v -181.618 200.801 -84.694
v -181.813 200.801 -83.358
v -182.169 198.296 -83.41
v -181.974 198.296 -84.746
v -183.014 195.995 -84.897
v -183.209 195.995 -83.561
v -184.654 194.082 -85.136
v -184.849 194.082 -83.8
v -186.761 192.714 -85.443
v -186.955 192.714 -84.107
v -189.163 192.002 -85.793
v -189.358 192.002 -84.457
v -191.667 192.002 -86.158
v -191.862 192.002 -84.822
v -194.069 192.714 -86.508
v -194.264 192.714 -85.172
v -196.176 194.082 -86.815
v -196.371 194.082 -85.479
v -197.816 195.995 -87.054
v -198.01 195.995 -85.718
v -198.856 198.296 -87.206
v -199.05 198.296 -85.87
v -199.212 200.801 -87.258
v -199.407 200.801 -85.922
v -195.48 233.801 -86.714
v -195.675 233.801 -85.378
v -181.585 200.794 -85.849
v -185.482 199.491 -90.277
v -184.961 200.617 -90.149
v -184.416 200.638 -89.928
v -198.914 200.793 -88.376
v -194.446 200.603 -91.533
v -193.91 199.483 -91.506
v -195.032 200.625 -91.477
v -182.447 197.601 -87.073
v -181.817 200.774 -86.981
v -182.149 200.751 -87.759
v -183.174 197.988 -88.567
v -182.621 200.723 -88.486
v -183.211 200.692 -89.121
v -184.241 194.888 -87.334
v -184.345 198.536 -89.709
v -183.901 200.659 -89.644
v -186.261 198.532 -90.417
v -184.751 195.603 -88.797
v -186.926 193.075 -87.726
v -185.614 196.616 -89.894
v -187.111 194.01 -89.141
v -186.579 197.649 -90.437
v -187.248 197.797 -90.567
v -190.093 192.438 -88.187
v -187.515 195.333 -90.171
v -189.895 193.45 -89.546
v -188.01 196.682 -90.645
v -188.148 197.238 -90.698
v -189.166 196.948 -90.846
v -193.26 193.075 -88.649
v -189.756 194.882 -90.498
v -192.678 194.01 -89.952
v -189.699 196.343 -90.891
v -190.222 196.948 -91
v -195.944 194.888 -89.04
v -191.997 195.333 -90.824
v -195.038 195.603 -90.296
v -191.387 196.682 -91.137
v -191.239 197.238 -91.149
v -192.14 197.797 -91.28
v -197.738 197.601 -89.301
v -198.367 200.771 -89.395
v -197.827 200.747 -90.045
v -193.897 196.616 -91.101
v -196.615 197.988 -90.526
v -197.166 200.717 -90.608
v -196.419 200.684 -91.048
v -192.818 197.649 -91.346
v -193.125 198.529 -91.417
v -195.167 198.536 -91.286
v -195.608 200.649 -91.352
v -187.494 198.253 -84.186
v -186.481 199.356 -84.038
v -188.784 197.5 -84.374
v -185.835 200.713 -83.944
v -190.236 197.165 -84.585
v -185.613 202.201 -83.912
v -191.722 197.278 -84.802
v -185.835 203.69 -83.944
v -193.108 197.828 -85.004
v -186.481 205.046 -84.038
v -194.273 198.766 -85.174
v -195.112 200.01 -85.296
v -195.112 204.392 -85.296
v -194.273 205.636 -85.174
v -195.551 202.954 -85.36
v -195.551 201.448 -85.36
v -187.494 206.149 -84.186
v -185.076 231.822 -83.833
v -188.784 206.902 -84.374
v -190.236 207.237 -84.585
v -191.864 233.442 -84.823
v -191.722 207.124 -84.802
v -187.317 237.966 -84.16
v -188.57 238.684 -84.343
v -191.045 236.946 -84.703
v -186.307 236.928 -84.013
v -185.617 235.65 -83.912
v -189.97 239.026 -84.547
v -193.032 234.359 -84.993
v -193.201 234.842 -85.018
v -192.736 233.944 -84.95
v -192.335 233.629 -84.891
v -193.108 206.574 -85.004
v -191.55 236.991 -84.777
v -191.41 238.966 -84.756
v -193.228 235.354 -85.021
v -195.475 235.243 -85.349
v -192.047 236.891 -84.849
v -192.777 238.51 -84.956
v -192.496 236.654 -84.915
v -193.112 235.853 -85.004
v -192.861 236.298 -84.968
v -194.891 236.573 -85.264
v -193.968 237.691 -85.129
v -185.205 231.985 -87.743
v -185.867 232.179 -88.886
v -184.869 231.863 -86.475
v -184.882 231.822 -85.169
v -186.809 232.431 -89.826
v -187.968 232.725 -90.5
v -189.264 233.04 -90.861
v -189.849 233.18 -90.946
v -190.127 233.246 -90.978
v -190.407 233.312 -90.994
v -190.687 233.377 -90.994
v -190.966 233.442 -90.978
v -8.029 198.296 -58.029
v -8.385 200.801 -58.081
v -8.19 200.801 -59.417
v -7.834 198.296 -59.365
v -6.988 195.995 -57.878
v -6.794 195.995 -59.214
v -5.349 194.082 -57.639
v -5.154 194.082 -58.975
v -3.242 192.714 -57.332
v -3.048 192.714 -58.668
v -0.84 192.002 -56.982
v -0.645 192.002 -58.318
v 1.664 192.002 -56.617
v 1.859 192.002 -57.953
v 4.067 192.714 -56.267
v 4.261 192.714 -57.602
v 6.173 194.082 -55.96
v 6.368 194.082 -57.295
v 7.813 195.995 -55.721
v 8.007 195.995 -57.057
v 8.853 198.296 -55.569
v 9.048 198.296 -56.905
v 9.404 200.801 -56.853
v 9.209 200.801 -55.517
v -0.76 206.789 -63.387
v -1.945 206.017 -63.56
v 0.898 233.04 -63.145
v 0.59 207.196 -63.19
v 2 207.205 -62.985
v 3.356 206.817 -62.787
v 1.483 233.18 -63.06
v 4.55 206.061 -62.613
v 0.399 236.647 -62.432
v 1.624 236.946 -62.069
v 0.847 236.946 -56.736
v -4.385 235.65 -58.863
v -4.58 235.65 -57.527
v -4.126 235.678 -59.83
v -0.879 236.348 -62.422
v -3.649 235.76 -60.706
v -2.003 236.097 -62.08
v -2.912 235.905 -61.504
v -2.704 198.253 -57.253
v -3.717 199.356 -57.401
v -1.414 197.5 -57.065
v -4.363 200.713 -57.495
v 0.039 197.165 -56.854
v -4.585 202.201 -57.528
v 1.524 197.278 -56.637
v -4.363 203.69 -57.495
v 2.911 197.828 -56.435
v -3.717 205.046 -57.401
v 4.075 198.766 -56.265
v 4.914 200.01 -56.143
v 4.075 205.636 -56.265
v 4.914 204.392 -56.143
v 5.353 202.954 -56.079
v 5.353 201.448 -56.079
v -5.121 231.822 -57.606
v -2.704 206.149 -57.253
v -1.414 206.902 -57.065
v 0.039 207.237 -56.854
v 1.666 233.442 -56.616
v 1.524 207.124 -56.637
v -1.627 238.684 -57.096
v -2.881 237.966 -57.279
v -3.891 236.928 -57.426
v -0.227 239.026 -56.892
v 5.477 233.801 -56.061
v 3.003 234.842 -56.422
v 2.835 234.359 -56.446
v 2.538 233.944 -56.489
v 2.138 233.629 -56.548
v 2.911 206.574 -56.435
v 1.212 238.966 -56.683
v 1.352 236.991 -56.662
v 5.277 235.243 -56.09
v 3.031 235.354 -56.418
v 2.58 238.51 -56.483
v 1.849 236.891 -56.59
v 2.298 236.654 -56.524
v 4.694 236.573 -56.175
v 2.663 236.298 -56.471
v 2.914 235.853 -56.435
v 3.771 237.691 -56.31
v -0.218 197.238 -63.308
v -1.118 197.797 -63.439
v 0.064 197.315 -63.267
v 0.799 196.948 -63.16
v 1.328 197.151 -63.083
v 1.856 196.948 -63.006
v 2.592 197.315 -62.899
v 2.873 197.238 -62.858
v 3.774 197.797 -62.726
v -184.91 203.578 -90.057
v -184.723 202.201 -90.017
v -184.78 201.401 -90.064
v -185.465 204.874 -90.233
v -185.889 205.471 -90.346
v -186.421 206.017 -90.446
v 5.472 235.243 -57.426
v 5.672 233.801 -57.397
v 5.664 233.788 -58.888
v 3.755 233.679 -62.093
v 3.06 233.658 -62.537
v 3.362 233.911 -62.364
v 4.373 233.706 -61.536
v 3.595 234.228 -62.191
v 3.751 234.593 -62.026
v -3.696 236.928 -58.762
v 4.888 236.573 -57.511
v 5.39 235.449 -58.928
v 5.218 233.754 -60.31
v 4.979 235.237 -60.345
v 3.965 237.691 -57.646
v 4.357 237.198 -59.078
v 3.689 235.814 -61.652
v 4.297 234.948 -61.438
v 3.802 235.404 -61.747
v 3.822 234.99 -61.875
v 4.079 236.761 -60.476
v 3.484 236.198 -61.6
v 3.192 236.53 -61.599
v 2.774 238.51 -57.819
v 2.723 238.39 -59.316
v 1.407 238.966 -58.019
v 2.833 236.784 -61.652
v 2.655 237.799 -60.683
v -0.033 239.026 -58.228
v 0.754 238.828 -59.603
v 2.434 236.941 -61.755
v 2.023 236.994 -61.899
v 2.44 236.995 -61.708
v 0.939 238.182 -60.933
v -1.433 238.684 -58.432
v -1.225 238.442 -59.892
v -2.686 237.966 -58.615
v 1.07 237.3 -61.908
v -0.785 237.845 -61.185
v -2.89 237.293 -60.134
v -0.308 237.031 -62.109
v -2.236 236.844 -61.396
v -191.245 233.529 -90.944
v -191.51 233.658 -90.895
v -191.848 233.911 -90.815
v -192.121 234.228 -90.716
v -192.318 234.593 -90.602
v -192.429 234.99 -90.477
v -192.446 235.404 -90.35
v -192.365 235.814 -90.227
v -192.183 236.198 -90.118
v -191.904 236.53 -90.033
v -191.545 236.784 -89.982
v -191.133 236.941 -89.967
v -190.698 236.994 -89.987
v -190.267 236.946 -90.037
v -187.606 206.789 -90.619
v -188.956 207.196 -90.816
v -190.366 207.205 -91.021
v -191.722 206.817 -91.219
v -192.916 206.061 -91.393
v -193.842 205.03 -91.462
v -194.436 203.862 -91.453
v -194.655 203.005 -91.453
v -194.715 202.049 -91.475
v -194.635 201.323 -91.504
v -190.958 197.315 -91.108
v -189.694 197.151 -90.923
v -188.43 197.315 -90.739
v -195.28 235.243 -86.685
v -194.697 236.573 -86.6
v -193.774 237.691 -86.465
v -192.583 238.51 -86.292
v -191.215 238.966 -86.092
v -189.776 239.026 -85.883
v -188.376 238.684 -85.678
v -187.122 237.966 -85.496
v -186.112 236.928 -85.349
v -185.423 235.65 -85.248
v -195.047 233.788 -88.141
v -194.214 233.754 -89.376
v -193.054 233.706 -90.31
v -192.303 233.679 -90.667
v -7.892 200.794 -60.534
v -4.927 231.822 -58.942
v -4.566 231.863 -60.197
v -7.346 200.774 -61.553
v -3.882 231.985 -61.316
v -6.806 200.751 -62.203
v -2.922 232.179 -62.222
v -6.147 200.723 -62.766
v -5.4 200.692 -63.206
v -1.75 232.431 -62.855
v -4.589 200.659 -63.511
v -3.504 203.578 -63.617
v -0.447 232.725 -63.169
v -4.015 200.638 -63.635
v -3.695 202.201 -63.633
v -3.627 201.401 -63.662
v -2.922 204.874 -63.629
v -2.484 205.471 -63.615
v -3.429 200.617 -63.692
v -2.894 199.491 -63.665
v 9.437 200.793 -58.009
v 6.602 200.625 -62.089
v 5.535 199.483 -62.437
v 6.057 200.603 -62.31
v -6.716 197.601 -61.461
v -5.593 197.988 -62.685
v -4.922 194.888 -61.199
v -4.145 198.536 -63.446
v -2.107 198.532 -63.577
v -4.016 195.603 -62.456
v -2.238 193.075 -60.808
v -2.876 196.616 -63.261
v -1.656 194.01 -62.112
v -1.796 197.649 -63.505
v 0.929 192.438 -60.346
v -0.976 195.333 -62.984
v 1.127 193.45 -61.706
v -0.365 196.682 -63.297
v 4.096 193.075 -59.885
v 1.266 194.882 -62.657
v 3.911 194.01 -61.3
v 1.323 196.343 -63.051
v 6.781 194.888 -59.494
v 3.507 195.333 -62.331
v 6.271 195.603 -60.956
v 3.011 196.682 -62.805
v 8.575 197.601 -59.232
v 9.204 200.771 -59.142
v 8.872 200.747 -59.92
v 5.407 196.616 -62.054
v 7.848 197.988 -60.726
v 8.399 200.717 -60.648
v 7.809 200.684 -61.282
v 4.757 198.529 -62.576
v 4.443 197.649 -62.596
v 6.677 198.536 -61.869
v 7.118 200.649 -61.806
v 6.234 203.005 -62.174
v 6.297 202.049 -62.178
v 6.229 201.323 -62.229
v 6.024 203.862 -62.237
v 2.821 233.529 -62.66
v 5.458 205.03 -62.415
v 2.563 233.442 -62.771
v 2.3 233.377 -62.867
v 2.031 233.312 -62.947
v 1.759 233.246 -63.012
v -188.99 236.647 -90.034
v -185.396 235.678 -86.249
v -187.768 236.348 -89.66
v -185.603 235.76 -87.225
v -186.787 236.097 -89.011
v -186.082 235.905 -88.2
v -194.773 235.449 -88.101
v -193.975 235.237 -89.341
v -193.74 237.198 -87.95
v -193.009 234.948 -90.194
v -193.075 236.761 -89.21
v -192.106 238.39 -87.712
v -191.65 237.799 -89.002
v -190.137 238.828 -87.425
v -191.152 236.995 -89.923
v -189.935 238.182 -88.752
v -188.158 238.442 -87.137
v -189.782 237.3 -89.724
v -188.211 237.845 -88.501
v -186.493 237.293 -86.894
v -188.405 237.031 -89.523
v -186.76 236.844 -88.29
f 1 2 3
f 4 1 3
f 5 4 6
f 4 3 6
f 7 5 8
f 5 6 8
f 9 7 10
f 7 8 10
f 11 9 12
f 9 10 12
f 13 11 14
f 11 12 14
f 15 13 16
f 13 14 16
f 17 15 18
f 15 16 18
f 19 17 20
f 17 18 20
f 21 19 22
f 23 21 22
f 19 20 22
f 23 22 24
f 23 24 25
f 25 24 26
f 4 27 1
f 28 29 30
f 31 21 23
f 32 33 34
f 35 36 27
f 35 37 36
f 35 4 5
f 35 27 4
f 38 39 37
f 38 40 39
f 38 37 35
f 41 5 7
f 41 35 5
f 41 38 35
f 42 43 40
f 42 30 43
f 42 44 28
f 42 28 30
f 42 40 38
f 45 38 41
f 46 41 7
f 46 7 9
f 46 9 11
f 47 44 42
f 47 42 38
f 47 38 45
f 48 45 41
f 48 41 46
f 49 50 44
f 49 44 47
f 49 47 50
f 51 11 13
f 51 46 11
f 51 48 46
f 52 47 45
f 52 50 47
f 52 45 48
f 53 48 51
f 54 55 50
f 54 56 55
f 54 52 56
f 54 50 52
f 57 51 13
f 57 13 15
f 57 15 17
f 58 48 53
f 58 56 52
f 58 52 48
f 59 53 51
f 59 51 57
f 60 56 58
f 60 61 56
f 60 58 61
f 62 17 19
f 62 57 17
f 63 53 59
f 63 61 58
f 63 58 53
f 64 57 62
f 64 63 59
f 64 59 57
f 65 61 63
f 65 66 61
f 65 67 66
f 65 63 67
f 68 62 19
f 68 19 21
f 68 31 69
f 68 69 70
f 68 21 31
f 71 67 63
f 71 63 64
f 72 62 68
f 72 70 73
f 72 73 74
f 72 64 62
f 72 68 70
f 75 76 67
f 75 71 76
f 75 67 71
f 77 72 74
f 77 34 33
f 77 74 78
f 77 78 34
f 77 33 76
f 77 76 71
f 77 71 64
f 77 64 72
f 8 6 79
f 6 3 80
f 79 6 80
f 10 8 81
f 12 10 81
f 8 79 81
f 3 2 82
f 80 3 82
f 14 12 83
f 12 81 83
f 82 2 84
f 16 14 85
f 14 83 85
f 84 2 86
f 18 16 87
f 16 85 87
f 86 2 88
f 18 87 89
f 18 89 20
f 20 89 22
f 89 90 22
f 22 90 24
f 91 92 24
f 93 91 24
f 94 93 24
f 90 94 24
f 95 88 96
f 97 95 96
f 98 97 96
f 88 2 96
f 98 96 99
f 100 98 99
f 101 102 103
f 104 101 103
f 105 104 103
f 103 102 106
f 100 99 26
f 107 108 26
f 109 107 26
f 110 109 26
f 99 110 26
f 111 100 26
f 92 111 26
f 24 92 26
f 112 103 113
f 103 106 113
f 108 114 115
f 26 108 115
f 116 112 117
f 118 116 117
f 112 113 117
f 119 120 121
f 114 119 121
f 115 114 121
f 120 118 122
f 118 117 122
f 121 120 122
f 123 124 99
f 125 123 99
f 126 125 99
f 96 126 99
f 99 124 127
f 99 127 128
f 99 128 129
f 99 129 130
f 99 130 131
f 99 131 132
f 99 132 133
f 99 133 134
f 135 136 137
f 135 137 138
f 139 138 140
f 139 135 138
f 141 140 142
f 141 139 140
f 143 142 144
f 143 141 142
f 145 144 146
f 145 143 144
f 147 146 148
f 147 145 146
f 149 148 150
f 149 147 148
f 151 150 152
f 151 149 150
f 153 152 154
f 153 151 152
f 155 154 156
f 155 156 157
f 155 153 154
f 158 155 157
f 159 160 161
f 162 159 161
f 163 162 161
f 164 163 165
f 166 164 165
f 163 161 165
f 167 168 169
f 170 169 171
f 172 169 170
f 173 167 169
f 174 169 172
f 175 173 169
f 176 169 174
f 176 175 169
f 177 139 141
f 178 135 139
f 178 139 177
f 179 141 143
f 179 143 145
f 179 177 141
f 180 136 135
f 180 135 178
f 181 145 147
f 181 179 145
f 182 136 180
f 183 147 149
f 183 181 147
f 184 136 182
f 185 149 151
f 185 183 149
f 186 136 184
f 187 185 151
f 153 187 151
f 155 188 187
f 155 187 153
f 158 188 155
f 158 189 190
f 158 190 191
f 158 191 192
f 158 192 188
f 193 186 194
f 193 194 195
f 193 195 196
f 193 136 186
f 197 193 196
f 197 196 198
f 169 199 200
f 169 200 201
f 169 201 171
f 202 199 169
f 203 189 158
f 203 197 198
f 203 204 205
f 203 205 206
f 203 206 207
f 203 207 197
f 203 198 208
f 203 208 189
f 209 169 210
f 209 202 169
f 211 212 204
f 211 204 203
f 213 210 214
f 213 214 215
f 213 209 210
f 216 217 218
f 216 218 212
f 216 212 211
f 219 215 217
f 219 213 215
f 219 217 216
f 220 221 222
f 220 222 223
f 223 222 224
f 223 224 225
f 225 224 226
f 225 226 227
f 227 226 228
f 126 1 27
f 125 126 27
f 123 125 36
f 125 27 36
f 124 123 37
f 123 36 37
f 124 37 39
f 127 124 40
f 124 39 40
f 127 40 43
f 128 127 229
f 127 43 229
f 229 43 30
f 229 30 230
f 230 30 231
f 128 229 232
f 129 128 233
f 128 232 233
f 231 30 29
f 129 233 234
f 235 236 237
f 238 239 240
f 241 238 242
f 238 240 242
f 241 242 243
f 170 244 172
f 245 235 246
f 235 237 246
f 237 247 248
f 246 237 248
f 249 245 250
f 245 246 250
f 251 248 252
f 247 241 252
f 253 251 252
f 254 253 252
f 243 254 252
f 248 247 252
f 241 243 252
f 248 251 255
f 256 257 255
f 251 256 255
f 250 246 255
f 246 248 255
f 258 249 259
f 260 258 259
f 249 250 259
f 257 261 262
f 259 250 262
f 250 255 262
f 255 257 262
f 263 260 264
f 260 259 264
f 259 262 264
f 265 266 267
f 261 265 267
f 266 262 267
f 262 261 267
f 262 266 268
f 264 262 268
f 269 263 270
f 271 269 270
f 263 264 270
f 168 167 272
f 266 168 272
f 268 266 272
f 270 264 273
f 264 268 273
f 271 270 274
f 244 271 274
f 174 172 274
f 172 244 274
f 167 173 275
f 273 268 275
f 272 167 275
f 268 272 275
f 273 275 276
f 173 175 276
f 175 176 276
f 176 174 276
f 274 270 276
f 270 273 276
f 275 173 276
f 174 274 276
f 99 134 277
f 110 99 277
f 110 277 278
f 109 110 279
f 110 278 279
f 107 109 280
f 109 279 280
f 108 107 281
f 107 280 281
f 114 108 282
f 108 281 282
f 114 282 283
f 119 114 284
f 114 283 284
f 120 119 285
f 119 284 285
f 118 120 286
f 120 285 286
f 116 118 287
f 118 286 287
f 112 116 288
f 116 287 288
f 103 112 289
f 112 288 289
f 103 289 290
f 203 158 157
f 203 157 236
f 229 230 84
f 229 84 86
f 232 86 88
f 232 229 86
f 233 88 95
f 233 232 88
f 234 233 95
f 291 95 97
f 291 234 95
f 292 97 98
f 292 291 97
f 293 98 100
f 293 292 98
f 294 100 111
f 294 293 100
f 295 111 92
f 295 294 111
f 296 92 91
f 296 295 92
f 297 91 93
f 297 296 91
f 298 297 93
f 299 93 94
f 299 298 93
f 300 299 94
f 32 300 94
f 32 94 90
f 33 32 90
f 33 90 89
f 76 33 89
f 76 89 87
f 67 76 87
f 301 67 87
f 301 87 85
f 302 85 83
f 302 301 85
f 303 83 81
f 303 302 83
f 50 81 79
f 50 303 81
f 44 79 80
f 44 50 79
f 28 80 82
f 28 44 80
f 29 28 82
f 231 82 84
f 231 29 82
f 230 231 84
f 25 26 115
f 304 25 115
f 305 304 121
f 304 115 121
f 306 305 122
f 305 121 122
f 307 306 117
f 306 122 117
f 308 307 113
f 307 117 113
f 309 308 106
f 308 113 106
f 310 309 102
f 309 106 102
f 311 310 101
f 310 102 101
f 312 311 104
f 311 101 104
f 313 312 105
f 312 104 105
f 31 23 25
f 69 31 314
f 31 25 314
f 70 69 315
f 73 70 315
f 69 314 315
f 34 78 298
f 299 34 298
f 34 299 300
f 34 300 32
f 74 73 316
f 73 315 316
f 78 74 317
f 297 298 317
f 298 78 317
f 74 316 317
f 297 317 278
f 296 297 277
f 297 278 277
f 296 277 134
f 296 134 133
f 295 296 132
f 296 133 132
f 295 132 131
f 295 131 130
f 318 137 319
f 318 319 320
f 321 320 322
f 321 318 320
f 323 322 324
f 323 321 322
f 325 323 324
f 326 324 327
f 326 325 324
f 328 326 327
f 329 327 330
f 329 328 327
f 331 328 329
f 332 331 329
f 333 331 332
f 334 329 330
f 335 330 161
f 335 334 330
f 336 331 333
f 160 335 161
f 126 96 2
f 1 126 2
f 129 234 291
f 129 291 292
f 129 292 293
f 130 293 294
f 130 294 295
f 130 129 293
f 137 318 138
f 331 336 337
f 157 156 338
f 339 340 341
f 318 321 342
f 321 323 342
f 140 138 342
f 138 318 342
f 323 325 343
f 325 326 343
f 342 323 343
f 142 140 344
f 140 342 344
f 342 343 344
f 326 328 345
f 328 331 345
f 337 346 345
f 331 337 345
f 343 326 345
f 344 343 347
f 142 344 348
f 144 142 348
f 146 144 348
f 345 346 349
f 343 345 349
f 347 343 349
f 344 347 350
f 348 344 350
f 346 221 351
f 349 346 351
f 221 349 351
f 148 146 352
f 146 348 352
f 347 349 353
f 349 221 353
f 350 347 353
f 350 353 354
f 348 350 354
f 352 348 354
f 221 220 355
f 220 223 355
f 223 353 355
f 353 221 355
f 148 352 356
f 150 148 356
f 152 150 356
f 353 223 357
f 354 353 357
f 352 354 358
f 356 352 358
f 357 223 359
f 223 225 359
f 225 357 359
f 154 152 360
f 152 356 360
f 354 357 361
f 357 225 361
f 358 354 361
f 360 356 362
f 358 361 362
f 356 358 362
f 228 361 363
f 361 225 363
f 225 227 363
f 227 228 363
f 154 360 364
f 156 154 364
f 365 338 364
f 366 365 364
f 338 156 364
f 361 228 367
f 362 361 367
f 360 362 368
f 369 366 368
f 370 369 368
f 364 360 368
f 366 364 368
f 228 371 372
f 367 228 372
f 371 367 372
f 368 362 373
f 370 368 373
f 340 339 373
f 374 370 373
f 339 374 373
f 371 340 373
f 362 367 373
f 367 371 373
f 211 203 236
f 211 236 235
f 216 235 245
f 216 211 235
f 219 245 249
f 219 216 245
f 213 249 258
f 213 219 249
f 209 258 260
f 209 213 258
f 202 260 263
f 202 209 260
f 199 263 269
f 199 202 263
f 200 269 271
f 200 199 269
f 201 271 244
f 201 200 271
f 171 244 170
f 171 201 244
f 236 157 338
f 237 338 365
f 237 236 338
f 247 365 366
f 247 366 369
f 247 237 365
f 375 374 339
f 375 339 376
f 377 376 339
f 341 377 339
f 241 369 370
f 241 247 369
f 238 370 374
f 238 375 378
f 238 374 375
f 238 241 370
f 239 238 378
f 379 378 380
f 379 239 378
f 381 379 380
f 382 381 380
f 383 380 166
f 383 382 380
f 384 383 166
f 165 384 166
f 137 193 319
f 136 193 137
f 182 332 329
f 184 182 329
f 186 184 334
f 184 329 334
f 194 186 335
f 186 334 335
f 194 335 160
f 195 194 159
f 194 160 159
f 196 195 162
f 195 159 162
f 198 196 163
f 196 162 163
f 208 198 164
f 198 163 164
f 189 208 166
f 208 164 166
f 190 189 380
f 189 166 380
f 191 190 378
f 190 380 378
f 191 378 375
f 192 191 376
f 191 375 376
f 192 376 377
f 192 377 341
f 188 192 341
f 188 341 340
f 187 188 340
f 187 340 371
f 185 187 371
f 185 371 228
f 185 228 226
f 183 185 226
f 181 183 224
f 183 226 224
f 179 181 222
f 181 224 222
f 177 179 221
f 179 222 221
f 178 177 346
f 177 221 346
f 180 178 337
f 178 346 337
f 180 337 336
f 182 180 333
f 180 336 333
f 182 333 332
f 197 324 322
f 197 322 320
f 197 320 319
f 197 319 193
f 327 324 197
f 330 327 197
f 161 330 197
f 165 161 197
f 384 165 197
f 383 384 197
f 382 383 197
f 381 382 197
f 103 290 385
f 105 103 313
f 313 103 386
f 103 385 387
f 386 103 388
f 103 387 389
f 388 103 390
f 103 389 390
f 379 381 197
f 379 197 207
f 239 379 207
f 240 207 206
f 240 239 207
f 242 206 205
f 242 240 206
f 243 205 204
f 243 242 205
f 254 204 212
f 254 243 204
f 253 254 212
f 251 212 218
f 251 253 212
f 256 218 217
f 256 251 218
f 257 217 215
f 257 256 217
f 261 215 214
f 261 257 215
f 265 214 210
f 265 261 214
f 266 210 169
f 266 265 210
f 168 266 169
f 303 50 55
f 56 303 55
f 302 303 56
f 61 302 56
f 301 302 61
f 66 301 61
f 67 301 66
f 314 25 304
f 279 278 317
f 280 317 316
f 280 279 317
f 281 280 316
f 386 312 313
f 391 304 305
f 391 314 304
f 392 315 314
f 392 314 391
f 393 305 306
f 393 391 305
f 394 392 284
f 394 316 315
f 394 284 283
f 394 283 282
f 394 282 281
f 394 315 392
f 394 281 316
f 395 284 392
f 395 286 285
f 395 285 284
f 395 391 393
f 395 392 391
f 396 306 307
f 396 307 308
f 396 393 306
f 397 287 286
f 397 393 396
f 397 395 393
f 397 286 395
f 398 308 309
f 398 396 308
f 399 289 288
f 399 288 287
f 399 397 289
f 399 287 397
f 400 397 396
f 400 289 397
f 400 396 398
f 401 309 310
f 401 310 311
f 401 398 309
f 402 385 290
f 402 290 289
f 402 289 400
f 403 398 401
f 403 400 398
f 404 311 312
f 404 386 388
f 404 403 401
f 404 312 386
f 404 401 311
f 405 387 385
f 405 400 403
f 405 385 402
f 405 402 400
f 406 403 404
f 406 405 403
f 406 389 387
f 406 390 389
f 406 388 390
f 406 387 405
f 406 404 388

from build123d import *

# Parameters (mm, degrees)
BASE_EXTRUDE_DEPTH = 6.35
FILLET1_R          = 5
CUT_EXTRUDE1_REACH = 245.045
SKETCH4_R          = 5.05
CUT_EXTRUDE2_DEPTH = 6.35


with BuildPart() as part:
    # Sketch1 → Base Extrude (new body)
    with BuildSketch(Plane(origin=(8.114628625, -3.283425705, -55.67660861), x_dir=(-0.98954535441322, 0, -0.14422202175539944), z_dir=(0.14422202175539944, 0, -0.98954535441322))):
        with BuildLine():
            Line((-1.106091457, 204.084448373), (2.665349365, 237.084448373))
            ThreePointArc((2.665349365, 237.084448373), (7.915349365, 242.334448373), (13.165349365, 237.084448373))
            Line((13.165349365, 237.084448373), (16.673908543, 204.084448373))
            ThreePointArc((16.673908543, 204.084448373), (7.783908543, 195.194448373), (-1.106091457, 204.084448373))
        make_face()
    extrude(amount=BASE_EXTRUDE_DEPTH)

    # Fillet1
    fillet1_edges = [part.edges().sort_by_distance(p)[0] for p in [
        (1.19784127, 239.051022668, -63.101789298),
        (8.258960253, 217.301022668, -62.072661274),
        (1.327907925, 191.911022668, -63.082832637),
        (-5.733211058, 217.301022668, -64.111960662),
    ]]
    fillet(fillet1_edges, radius=FILLET1_R)

    # Cut-Extrude1: up to this face of the body (flat: up to its plane)
    cut_extrude1_end = Plane(part.part.faces().sort_by_distance((0.359463879, 213.5685835, -56.806890849))[0])
    # Sketch3 → Cut-Extrude1 (cut, up to the picked face)
    with BuildSketch(Plane(origin=(9.030438463, -3.283425705, -61.96022161), x_dir=(-0.98954535441322, 0, -0.14422202175539942), z_dir=(0.14422202175539942, 0, -0.98954535441322)), mode=Mode.PRIVATE) as cut_extrude1_sk1:
        with BuildLine():
            Line((14.3026167, 234.886394841), (6.516843813, 236.725345777))
            ThreePointArc((6.516843813, 236.725345777), (5.178808874, 238.890908637), (7.344371734, 240.228943576))
            Line((7.344371734, 240.228943576), (15.130144622, 238.38999264))
            ThreePointArc((15.130144622, 238.38999264), (16.468179561, 236.22442978), (14.3026167, 234.886394841))
        make_face()
    cut_extrude1_tool1 = split(extrude(cut_extrude1_sk1.sketch, amount=-CUT_EXTRUDE1_REACH, mode=Mode.PRIVATE), bisect_by=cut_extrude1_end, keep=Keep.BOTH, mode=Mode.PRIVATE)
    add(cut_extrude1_tool1.solids().sort_by(Axis((-1.6799, 234.274244, -63.521208), (-0.14422202175539942, 0, 0.98954535441322)))[0], mode=Mode.SUBTRACT)


with BuildPart() as body_2:
    # Mirror2: mirrored copy
    add(part.part.mirror(Plane(origin=(-103.213448145, 0, -15.042920567), x_dir=(-0.14422202175539944, 0, 0.98954535441322), z_dir=(0.98954535441322, 0, 0.14422202175539944))))


with BuildPart() as part_1:
    add(part.part)

    # Sketch4 → Cut-Extrude2 (cut)
    with BuildSketch(Plane(origin=(9.030438463, 0, -61.96022161), x_dir=(-0.98954535441322, 0, -0.14422202175539944), z_dir=(0.14422202175539944, 0, -0.98954535441322))):
        with Locations((7.783908543, 202.201022668)):
            Circle(SKETCH4_R)
    cut_extrude2 = extrude(amount=-CUT_EXTRUDE2_DEPTH, mode=Mode.SUBTRACT)


with BuildPart() as body_2_1:
    add(body_2.part)

    # Mirror3: Cut-Extrude2 across plane
    add(cut_extrude2.mirror(Plane(origin=(-103.213448145, 0, -15.042920567), x_dir=(-0.14422202175539944, 0, 0.98954535441322), z_dir=(0.98954535441322, 0, 0.14422202175539944))), mode=Mode.SUBTRACT)


solid = Compound([part_1.part, body_2_1.part])
